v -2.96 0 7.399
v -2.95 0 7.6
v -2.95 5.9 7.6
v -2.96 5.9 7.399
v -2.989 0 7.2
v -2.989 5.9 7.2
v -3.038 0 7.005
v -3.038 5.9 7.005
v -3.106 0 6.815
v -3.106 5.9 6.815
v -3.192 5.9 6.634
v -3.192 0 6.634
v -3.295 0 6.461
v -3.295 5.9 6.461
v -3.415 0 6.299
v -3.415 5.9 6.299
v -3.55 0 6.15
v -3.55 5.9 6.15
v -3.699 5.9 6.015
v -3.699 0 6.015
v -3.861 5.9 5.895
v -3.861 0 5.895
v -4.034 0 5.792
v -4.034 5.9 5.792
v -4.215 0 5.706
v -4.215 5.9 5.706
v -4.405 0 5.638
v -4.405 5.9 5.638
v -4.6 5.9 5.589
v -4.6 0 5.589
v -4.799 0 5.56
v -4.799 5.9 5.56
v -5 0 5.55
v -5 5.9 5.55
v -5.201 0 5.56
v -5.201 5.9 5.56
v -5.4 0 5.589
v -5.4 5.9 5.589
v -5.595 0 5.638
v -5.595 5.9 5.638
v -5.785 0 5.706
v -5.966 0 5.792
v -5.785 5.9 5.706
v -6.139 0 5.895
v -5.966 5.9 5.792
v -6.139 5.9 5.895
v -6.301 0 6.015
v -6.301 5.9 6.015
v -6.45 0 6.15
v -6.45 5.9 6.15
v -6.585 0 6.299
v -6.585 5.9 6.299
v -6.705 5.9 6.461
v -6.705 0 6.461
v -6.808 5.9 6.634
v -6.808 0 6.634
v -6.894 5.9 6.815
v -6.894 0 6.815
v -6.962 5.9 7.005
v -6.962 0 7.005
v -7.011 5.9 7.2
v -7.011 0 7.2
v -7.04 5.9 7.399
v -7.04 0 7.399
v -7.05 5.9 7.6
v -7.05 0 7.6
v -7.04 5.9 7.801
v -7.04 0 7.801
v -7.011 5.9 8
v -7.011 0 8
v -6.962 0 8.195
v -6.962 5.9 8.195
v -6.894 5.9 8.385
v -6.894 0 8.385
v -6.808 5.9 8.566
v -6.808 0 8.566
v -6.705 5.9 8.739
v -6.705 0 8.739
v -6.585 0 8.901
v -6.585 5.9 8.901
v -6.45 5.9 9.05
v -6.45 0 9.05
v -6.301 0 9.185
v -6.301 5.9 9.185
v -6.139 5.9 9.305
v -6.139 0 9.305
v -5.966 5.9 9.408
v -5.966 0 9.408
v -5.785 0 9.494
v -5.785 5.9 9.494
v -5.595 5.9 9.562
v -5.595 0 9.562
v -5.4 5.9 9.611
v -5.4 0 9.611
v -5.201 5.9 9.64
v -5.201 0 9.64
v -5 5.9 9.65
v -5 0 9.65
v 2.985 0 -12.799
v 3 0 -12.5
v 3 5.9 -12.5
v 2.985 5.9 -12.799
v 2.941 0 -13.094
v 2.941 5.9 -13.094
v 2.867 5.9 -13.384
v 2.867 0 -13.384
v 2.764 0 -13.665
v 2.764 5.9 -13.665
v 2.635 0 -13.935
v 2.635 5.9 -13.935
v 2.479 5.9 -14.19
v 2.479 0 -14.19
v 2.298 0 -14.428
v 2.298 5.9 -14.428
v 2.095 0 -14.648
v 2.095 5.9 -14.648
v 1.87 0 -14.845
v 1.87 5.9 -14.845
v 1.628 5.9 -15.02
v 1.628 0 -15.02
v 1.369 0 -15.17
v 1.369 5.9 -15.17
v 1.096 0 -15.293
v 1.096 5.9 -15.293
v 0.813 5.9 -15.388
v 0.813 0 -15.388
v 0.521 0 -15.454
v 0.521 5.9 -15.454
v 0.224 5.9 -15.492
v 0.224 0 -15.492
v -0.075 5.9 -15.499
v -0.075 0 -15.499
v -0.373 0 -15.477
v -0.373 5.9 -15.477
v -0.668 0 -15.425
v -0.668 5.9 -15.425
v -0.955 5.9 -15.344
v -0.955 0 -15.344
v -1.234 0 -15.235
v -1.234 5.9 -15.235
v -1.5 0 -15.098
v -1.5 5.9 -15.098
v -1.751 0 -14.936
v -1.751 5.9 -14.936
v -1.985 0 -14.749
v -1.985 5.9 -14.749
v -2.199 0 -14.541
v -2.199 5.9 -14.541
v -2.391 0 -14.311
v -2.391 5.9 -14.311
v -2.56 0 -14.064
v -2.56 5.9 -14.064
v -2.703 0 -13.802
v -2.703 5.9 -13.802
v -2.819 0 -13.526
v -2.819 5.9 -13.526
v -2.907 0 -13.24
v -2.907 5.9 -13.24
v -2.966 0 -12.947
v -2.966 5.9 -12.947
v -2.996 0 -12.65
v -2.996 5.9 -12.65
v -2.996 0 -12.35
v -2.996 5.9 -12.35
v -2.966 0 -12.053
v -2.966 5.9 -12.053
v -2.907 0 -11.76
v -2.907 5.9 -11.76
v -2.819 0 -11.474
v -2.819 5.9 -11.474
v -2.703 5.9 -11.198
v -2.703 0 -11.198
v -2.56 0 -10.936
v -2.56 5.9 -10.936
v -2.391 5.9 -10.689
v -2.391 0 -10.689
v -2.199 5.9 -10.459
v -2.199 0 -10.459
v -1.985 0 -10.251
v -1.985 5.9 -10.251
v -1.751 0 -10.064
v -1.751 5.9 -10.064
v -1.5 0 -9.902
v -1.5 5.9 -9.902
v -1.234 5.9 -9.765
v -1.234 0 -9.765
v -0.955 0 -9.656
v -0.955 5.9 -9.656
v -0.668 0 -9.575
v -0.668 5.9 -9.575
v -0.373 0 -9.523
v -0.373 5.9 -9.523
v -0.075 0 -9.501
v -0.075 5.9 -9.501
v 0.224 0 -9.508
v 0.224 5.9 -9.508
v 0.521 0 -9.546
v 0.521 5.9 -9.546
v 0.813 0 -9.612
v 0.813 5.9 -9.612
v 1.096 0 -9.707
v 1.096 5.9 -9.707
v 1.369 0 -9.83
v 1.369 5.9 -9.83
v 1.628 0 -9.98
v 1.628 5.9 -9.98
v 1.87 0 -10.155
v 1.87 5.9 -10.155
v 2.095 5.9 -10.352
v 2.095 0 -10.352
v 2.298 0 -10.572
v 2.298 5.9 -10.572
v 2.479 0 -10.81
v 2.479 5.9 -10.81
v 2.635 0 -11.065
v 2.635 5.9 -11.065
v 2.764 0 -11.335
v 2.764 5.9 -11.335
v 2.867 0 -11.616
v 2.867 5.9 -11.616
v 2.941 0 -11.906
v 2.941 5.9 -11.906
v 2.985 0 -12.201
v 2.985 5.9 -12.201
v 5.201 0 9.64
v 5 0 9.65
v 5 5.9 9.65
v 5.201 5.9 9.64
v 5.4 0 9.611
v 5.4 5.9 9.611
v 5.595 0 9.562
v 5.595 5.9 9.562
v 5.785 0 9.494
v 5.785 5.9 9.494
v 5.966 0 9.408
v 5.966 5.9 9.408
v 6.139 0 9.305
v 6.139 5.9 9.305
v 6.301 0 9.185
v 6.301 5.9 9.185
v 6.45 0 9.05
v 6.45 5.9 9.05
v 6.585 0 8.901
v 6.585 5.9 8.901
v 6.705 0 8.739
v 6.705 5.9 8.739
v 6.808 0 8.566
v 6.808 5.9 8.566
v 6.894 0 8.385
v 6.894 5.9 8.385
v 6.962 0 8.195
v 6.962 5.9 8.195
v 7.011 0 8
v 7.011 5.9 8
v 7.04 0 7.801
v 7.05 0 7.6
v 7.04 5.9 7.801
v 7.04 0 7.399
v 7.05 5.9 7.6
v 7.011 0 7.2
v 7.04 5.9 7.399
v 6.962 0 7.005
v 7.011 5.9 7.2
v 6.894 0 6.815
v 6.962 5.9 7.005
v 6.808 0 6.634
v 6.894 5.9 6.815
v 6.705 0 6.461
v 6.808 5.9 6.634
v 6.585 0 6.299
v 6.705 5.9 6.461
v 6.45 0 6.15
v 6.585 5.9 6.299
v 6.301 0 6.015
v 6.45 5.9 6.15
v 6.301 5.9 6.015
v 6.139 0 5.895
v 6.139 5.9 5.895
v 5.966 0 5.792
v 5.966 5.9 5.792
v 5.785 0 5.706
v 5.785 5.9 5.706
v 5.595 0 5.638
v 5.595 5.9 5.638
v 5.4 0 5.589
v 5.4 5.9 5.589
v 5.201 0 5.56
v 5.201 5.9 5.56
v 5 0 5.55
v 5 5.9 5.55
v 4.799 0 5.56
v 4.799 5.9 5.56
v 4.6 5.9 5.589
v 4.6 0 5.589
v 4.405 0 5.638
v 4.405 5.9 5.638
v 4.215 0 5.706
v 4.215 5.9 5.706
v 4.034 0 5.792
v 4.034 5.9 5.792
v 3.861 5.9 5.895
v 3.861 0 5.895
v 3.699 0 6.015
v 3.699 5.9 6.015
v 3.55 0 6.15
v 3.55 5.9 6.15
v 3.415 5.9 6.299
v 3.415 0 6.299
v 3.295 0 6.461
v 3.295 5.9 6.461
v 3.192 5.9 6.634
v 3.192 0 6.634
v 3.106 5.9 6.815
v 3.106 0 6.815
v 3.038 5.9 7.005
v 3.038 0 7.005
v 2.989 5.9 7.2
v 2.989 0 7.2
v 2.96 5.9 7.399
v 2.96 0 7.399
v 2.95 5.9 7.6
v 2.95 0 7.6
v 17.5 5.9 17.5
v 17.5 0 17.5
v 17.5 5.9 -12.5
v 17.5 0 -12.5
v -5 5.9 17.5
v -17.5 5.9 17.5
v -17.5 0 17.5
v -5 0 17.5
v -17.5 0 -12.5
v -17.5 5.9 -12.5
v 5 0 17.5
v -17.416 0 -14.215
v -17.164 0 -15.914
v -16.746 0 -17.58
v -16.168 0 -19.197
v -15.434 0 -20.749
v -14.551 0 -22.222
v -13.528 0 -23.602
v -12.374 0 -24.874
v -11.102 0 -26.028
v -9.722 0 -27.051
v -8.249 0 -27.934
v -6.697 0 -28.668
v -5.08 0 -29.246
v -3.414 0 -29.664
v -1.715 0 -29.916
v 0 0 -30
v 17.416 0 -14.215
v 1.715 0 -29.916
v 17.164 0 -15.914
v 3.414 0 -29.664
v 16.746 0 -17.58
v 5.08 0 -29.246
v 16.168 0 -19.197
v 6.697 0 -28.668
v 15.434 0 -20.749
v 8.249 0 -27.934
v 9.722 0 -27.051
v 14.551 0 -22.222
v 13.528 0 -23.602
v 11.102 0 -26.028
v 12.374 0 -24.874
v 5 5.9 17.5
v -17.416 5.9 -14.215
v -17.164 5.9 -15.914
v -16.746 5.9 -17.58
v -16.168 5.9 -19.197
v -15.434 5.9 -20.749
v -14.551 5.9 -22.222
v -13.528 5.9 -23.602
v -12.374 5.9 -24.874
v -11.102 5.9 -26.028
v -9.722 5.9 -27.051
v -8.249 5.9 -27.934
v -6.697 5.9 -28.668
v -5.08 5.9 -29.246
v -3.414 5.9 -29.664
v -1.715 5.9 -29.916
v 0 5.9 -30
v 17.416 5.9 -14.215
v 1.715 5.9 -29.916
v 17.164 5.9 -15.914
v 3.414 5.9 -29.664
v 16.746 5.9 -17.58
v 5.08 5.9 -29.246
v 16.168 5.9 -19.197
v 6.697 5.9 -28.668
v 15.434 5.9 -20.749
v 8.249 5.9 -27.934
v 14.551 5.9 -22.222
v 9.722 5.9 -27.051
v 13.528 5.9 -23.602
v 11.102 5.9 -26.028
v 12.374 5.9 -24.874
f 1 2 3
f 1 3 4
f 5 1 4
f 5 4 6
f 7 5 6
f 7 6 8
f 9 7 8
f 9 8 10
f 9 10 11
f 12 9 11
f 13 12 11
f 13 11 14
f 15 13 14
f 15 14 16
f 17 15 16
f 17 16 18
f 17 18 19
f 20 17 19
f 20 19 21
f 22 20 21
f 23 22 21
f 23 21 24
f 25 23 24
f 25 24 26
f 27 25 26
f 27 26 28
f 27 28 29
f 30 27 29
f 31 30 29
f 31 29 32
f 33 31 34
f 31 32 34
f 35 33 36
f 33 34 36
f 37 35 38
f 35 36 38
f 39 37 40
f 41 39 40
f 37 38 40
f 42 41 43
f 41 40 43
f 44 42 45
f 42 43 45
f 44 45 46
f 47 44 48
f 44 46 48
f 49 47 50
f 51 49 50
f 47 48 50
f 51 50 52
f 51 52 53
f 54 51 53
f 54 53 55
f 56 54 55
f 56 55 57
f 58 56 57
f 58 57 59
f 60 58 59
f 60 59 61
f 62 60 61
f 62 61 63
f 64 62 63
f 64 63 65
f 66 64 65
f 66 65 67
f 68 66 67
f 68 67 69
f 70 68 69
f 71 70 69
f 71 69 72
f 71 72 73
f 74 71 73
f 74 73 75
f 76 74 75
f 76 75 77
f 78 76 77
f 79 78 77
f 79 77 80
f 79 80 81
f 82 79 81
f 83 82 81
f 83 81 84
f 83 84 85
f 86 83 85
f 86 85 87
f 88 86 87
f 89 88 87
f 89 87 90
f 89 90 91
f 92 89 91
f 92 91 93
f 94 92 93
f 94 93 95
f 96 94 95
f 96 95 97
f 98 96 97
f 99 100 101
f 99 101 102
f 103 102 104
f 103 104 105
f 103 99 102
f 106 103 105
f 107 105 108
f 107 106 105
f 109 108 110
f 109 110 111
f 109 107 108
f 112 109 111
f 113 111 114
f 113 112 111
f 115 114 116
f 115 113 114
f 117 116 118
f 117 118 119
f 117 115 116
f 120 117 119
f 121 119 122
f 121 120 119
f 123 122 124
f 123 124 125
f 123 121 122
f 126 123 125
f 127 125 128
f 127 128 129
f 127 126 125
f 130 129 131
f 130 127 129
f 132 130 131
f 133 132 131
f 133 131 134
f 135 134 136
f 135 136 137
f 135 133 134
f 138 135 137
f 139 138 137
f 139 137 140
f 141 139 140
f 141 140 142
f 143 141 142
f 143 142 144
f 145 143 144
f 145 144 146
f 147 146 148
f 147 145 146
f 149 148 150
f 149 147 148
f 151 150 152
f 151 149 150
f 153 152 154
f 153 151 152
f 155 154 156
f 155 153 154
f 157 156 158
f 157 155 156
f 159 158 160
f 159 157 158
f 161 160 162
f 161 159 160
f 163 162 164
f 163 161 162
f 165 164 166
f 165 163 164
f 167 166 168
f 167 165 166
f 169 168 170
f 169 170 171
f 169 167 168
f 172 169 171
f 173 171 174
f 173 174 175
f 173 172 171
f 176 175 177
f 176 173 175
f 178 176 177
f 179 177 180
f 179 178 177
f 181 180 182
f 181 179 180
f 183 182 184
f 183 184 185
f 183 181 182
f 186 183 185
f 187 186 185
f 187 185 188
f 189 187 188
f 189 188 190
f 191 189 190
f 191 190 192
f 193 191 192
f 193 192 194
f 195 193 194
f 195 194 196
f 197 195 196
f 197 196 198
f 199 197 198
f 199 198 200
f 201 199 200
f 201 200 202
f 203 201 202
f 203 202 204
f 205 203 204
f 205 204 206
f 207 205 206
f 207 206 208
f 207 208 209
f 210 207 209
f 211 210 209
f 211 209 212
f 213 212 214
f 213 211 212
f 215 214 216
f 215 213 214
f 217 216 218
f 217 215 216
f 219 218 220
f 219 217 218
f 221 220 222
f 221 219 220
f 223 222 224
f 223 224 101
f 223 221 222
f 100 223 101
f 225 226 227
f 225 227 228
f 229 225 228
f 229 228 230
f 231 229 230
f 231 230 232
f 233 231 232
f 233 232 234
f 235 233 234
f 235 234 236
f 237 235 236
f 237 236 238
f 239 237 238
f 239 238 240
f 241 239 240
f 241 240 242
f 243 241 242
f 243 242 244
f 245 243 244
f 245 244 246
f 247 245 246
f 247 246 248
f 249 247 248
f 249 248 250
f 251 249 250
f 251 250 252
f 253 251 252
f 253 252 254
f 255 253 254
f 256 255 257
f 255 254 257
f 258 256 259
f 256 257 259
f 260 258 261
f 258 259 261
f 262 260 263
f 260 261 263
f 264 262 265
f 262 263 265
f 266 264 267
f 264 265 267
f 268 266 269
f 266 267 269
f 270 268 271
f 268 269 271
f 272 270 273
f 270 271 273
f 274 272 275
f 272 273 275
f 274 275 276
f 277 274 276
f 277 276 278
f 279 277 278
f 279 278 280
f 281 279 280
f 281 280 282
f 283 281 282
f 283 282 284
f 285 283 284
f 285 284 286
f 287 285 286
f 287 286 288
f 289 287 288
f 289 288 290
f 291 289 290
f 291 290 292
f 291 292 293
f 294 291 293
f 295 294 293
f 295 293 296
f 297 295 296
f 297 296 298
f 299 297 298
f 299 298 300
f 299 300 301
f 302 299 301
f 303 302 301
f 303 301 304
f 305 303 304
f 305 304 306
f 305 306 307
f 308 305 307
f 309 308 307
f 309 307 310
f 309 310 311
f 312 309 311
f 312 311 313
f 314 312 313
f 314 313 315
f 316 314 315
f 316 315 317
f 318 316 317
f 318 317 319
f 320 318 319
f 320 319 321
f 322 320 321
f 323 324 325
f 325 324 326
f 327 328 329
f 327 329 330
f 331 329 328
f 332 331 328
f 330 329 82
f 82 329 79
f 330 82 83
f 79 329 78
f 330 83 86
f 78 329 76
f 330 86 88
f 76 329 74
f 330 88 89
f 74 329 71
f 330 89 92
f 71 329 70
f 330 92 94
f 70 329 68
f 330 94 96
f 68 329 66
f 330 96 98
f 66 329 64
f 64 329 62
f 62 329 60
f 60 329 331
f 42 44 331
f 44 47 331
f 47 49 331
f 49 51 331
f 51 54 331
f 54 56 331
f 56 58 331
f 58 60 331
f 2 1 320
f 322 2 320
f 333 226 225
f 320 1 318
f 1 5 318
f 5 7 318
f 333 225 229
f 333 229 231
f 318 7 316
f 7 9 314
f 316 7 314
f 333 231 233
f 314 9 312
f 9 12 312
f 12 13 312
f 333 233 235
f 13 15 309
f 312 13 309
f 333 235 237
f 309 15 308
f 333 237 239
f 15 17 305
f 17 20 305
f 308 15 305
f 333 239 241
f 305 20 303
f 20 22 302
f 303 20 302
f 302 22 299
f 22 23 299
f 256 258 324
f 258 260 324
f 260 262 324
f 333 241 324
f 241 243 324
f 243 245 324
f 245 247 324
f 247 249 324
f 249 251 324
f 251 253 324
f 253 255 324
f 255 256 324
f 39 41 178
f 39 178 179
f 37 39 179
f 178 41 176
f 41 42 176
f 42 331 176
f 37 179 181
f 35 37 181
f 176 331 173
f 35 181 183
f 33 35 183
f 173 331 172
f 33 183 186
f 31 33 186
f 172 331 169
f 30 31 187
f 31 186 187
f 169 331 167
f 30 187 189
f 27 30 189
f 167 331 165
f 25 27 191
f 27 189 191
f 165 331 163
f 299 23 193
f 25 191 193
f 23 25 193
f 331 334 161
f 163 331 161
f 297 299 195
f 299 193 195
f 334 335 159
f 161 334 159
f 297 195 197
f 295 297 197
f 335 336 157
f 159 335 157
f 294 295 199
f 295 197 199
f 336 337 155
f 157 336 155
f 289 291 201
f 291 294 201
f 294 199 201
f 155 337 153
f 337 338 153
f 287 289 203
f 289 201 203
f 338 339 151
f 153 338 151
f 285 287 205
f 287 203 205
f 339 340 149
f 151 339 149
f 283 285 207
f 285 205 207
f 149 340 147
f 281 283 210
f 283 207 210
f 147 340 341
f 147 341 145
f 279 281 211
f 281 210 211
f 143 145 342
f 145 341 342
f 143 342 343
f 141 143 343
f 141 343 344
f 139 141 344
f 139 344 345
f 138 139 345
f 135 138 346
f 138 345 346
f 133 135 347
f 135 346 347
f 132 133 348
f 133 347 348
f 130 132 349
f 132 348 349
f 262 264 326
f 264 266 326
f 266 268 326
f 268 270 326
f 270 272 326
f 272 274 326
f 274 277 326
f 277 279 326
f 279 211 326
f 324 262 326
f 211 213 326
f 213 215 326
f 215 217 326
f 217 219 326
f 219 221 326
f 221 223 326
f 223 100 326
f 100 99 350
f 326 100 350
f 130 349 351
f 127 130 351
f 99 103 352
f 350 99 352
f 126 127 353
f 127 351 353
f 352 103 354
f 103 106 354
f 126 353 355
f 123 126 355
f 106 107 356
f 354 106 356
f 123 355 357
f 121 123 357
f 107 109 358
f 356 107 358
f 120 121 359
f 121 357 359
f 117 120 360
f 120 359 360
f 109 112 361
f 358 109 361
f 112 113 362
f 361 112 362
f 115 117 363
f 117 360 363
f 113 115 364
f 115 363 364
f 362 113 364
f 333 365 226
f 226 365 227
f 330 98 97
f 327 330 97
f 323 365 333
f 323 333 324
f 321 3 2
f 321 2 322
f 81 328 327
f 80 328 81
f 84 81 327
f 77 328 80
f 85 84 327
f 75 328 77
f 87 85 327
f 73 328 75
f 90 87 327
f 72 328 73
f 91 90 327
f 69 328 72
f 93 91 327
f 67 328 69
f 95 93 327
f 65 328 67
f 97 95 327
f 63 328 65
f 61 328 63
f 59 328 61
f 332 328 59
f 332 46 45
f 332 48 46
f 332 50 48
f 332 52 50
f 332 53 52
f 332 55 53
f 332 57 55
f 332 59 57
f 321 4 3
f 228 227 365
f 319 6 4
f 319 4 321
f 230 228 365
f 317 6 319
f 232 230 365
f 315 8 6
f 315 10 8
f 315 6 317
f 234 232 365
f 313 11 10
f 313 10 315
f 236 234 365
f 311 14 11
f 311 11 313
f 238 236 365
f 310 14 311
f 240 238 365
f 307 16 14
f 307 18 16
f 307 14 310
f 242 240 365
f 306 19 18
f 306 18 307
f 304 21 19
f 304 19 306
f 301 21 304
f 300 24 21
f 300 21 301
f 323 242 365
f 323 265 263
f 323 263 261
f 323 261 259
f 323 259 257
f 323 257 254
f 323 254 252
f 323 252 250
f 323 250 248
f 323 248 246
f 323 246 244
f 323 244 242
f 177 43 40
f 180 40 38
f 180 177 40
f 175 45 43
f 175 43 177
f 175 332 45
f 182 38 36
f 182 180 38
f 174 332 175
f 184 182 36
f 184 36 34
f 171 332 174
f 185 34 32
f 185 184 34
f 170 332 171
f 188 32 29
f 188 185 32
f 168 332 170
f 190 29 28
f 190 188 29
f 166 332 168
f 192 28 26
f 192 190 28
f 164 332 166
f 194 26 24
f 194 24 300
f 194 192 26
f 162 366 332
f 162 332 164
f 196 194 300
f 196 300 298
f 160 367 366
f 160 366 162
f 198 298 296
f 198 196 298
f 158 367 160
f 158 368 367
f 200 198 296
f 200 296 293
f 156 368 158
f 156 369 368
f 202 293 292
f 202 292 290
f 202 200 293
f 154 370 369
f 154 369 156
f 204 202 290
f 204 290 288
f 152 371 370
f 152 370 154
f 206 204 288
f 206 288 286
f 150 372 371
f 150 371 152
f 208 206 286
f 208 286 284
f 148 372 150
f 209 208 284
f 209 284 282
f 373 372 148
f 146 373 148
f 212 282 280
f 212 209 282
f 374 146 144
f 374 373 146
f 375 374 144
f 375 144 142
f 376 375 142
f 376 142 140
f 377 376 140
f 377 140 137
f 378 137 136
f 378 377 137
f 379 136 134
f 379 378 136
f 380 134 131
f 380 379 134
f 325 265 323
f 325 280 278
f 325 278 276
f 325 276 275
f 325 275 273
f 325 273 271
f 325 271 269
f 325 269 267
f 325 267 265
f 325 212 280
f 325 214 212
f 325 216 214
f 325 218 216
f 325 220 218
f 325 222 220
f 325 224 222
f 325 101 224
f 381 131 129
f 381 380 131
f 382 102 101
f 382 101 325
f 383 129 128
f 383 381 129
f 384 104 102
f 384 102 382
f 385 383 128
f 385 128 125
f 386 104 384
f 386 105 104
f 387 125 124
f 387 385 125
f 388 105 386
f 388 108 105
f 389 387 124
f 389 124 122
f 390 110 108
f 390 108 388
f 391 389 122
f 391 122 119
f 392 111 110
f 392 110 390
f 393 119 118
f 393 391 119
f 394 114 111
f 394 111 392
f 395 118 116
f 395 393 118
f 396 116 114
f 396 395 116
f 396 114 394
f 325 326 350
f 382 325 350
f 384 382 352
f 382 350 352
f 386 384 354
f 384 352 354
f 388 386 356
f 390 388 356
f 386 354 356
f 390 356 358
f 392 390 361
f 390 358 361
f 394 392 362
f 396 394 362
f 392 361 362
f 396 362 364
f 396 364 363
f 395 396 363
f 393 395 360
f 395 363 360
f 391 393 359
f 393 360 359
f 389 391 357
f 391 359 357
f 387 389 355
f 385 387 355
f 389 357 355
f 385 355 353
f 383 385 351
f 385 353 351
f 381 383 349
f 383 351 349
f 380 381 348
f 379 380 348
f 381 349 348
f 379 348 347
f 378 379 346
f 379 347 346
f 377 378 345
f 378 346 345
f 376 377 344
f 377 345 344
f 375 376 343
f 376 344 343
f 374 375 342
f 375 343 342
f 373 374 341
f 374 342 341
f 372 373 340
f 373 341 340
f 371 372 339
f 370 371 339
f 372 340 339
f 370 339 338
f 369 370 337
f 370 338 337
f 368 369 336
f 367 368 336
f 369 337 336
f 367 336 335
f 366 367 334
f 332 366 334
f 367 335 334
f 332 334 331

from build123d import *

# Parameters (mm, degrees)
SKETCH1_R           = 3
BOSS_EXTRUDE1_DEPTH = 5.9
CUT_EXTRUDE1_REACH  = 7.9
SKETCH2_W           = 10
SKETCH2_H           = 11.8
SKETCH3_W           = 12.5
SKETCH3_H           = 5.9
BOSS_EXTRUDE2_DEPTH = 5
CUT_EXTRUDE2_REACH  = 7.9
SKETCH4_R           = 2.05


with BuildPart() as part:
    # Sketch1 → Boss-Extrude1 (new body)
    with BuildSketch(Plane(origin=(0, 0, 0), x_dir=(1, 0, 0), z_dir=(0, 1, 0))):
        with BuildLine():
            ThreePointArc((17.5, 12.5), (0, 30), (-17.5, 12.5))
            Line((-17.5, 12.5), (-17.5, -12.5))
            Line((-17.5, -12.5), (17.5, -12.5))
            Line((17.5, -12.5), (17.5, 12.5))
        make_face()
        with Locations((0, 12.5)):
            Circle(SKETCH1_R, mode=Mode.SUBTRACT)
    extrude(amount=BOSS_EXTRUDE1_DEPTH)

    # Sketch2 → Cut-Extrude1 (cut, up to next)
    with BuildSketch(Plane(origin=(0, 5.9, 0), x_dir=(1, 0, 0), z_dir=(0, 1, 0)), mode=Mode.PRIVATE) as cut_extrude1_sk1:
        with Locations((0, -13.5)):
            Rectangle(SKETCH2_W, SKETCH2_H)
    cut_extrude1_tool1 = extrude(cut_extrude1_sk1.sketch, amount=-CUT_EXTRUDE1_REACH, mode=Mode.PRIVATE) & part.part
    add(cut_extrude1_tool1.solids().sort_by_distance((0, 5.9, 13.5))[0], mode=Mode.SUBTRACT)

    # Sketch3 → Boss-Extrude2 (add)
    with BuildSketch(Plane.XY.offset(12.5)):
        with Locations((-11.25, 2.95)):
            Rectangle(SKETCH3_W, SKETCH3_H)
        with Locations((11.25, 2.95)):
            Rectangle(SKETCH3_W, SKETCH3_H)
    extrude(amount=BOSS_EXTRUDE2_DEPTH)

    # Sketch4 → Cut-Extrude2 (cut, up to next)
    with BuildSketch(Plane(origin=(0, 5.9, 0), x_dir=(1, 0, 0), z_dir=(0, 1, 0)), mode=Mode.PRIVATE) as cut_extrude2_sk1:
        with Locations((-5, -7.6)):
            Circle(SKETCH4_R)
    cut_extrude2_tool1 = extrude(cut_extrude2_sk1.sketch, amount=-CUT_EXTRUDE2_REACH, mode=Mode.PRIVATE) & part.part
    add(cut_extrude2_tool1.solids().sort_by_distance((-5, 5.9, 7.6))[0], mode=Mode.SUBTRACT)
    # Sketch4 → Cut-Extrude2 (cut, up to next)
    with BuildSketch(Plane(origin=(0, 5.9, 0), x_dir=(1, 0, 0), z_dir=(0, 1, 0)), mode=Mode.PRIVATE) as cut_extrude2_sk2:
        with Locations((5, -7.6)):
            Circle(SKETCH4_R)
    cut_extrude2_tool2 = extrude(cut_extrude2_sk2.sketch, amount=-CUT_EXTRUDE2_REACH, mode=Mode.PRIVATE) & part.part
    add(cut_extrude2_tool2.solids().sort_by_distance((5, 5.9, 7.6))[0], mode=Mode.SUBTRACT)


solid = part.part
